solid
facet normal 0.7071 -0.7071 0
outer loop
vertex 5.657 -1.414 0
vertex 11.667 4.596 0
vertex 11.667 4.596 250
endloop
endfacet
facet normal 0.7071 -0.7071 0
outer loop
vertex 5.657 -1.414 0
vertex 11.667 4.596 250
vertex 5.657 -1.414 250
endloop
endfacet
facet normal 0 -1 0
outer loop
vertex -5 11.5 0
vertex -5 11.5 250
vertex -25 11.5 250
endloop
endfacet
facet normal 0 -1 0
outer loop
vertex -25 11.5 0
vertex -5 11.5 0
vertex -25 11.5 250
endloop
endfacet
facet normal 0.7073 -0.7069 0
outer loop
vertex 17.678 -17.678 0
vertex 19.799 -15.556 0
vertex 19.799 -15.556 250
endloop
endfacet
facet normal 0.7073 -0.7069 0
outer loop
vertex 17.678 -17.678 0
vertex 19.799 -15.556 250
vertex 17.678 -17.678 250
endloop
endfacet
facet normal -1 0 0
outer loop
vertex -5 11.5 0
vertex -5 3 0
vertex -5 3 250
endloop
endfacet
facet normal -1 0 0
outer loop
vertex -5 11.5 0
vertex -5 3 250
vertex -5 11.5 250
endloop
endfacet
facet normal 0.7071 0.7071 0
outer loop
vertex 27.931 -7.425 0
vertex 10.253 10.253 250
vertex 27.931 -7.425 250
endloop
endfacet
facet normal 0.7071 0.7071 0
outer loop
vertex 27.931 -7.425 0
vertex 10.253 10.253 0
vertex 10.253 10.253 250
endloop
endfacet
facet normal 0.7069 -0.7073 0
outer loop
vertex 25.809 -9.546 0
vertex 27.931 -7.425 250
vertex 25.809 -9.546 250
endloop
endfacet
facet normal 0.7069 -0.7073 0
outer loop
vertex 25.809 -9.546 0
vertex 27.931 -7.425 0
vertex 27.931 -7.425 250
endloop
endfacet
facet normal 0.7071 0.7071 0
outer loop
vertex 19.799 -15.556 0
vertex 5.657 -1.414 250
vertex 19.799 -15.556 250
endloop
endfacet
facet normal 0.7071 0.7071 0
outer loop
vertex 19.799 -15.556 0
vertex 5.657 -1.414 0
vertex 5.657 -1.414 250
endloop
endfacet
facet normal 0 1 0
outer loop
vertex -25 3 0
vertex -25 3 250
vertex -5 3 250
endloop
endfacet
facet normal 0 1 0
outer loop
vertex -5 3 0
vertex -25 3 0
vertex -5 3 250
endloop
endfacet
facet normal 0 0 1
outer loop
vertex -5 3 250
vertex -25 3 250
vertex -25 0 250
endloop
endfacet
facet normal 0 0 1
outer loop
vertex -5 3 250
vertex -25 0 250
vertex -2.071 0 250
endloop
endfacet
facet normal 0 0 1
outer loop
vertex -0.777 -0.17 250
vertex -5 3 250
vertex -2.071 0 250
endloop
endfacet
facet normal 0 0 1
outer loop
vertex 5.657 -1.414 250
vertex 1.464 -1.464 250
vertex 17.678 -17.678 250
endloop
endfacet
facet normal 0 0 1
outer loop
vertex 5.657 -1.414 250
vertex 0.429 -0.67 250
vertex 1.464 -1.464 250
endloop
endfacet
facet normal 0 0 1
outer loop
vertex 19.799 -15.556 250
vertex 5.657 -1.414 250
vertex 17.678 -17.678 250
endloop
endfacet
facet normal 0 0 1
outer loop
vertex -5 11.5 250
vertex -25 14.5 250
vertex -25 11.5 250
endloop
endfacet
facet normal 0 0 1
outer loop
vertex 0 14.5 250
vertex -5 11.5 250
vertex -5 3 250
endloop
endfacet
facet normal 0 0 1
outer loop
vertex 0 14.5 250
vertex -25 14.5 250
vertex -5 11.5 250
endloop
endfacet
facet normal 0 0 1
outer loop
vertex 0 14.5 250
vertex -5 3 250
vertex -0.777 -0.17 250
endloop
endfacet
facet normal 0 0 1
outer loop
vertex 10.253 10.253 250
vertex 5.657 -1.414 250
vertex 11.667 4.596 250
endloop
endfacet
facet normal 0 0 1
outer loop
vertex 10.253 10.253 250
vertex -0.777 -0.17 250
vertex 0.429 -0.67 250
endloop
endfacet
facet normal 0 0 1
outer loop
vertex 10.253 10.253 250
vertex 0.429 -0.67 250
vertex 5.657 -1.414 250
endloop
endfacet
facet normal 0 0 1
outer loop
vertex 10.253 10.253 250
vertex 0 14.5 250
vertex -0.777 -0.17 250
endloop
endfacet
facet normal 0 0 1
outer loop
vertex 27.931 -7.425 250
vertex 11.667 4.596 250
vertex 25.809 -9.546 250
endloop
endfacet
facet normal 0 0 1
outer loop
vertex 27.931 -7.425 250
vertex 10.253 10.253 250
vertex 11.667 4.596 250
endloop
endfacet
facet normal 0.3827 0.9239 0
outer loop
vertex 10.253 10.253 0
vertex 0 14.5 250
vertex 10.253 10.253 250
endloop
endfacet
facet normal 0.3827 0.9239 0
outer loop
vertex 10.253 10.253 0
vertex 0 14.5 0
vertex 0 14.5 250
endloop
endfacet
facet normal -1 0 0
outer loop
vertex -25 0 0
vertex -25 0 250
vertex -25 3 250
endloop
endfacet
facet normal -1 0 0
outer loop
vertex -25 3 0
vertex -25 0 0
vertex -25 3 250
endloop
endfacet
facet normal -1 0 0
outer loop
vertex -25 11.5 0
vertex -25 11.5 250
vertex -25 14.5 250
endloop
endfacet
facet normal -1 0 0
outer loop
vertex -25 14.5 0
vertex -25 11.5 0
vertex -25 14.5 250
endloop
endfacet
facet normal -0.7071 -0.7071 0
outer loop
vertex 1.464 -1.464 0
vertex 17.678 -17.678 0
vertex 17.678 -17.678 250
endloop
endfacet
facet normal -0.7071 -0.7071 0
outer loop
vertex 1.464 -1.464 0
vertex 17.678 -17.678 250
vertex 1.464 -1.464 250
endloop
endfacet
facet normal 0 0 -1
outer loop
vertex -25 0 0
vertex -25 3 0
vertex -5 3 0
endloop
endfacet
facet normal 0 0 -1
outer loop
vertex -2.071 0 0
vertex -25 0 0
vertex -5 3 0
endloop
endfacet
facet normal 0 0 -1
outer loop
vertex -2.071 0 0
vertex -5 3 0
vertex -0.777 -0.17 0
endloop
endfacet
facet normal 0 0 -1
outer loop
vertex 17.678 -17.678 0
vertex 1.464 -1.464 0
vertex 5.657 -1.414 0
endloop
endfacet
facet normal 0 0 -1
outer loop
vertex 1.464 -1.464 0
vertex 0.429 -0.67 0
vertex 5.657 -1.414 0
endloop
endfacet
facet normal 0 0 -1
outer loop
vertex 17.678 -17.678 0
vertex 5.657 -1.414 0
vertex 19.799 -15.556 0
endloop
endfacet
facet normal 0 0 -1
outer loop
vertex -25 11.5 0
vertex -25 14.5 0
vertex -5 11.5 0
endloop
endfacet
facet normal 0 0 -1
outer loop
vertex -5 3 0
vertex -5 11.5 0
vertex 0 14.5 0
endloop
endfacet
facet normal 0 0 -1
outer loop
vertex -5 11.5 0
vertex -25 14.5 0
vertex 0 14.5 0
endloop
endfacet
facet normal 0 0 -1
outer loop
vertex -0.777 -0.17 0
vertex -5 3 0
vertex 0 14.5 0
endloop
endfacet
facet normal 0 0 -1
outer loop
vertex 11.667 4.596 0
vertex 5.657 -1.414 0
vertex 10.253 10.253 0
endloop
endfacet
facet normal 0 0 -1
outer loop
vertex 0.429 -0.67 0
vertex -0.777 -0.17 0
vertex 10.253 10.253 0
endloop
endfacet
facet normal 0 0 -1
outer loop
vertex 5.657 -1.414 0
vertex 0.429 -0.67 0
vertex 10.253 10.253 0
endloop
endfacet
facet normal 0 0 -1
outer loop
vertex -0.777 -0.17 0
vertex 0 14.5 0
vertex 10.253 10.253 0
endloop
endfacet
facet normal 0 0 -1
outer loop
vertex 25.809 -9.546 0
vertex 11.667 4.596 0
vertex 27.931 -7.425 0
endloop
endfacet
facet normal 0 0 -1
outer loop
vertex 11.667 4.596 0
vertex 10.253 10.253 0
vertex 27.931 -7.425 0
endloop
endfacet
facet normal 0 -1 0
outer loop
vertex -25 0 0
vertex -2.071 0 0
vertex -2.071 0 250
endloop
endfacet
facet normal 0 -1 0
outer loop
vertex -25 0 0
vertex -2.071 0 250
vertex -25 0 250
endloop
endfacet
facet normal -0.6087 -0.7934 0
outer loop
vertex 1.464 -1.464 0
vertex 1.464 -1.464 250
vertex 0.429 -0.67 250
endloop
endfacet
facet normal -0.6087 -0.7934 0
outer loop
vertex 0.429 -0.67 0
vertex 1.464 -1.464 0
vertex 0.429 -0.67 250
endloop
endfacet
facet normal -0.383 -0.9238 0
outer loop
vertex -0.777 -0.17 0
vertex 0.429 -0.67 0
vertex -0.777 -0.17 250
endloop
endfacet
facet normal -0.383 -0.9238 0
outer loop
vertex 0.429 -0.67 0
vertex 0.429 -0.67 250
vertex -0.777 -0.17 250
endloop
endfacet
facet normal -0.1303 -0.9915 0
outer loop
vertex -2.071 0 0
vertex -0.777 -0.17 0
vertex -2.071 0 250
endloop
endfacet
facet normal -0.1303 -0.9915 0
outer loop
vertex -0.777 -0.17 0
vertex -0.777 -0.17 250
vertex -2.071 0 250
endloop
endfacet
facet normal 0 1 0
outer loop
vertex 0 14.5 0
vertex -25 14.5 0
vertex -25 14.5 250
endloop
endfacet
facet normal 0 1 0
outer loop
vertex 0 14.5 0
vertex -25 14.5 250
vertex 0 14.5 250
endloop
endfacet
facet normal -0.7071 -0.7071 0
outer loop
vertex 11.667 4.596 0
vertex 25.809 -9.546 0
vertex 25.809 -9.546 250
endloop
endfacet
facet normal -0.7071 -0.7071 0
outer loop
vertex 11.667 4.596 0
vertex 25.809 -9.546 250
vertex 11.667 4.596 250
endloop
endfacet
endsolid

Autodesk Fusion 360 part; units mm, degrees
sketch "Schizzo1" plane through (0, 0, 0) normal (0, 0, 1) x (1, 0, 0)
  line L0 (0, 0) -> (-25, 0)
  line L1 (-25, 0) -> (-25, 3)
  line L2 (-25, 3) -> (-5, 3)
  line L3 (-5, 3) -> (-5, 11.5)
  line L4 (-5, 11.5) -> (-25, 11.5)
  line L5 (-25, 11.5) -> (-25, 14.5)
  line L6 (-25, 14.5) -> (0, 14.5)
  line L7 (0, 14.5) -> (0, 0)
  line L8 (10.253, 10.253) -> (27.9307, -7.4246)
  line L9 (11.6673, 4.5962) -> (5.6569, -1.4142)
  line L10 (0, 0) -> (10.253, 10.253)
  line L11 (17.6777, -17.6777) -> (0, 0)
  line L12 (5.6569, -1.4142) -> (19.799, -15.5563)
  line L13 (27.9307, -7.4246) -> (25.8094, -9.5459)
  line L14 (19.799, -15.5563) -> (17.6777, -17.6777)
  line L15 (25.8094, -9.5459) -> (11.6673, 4.5962)
  line L16 (0, 14.5) -> (10.253, 10.253)
  point P0 (10.253, 10.253)
  dimension "d2" = 8.5
  dimension "d3" = 3
  dimension "d4" = 3
  dimension "d5" = 25
  dimension "d6" = 25
  dimension "d7" = 20
  dimension "d8" = 8.5
  dimension "d9" = 3
  dimension "d10" = 3
  dimension "d11" = 25
  dimension "d12" = 25
  dimension "d13" = 20
  dimension "d16" = 45
extrude "Estrusione1" add sketch "Schizzo1" along normal blind 250
fillet "Raccordo1" radius 5 1 edges at (0, 0, 125)
